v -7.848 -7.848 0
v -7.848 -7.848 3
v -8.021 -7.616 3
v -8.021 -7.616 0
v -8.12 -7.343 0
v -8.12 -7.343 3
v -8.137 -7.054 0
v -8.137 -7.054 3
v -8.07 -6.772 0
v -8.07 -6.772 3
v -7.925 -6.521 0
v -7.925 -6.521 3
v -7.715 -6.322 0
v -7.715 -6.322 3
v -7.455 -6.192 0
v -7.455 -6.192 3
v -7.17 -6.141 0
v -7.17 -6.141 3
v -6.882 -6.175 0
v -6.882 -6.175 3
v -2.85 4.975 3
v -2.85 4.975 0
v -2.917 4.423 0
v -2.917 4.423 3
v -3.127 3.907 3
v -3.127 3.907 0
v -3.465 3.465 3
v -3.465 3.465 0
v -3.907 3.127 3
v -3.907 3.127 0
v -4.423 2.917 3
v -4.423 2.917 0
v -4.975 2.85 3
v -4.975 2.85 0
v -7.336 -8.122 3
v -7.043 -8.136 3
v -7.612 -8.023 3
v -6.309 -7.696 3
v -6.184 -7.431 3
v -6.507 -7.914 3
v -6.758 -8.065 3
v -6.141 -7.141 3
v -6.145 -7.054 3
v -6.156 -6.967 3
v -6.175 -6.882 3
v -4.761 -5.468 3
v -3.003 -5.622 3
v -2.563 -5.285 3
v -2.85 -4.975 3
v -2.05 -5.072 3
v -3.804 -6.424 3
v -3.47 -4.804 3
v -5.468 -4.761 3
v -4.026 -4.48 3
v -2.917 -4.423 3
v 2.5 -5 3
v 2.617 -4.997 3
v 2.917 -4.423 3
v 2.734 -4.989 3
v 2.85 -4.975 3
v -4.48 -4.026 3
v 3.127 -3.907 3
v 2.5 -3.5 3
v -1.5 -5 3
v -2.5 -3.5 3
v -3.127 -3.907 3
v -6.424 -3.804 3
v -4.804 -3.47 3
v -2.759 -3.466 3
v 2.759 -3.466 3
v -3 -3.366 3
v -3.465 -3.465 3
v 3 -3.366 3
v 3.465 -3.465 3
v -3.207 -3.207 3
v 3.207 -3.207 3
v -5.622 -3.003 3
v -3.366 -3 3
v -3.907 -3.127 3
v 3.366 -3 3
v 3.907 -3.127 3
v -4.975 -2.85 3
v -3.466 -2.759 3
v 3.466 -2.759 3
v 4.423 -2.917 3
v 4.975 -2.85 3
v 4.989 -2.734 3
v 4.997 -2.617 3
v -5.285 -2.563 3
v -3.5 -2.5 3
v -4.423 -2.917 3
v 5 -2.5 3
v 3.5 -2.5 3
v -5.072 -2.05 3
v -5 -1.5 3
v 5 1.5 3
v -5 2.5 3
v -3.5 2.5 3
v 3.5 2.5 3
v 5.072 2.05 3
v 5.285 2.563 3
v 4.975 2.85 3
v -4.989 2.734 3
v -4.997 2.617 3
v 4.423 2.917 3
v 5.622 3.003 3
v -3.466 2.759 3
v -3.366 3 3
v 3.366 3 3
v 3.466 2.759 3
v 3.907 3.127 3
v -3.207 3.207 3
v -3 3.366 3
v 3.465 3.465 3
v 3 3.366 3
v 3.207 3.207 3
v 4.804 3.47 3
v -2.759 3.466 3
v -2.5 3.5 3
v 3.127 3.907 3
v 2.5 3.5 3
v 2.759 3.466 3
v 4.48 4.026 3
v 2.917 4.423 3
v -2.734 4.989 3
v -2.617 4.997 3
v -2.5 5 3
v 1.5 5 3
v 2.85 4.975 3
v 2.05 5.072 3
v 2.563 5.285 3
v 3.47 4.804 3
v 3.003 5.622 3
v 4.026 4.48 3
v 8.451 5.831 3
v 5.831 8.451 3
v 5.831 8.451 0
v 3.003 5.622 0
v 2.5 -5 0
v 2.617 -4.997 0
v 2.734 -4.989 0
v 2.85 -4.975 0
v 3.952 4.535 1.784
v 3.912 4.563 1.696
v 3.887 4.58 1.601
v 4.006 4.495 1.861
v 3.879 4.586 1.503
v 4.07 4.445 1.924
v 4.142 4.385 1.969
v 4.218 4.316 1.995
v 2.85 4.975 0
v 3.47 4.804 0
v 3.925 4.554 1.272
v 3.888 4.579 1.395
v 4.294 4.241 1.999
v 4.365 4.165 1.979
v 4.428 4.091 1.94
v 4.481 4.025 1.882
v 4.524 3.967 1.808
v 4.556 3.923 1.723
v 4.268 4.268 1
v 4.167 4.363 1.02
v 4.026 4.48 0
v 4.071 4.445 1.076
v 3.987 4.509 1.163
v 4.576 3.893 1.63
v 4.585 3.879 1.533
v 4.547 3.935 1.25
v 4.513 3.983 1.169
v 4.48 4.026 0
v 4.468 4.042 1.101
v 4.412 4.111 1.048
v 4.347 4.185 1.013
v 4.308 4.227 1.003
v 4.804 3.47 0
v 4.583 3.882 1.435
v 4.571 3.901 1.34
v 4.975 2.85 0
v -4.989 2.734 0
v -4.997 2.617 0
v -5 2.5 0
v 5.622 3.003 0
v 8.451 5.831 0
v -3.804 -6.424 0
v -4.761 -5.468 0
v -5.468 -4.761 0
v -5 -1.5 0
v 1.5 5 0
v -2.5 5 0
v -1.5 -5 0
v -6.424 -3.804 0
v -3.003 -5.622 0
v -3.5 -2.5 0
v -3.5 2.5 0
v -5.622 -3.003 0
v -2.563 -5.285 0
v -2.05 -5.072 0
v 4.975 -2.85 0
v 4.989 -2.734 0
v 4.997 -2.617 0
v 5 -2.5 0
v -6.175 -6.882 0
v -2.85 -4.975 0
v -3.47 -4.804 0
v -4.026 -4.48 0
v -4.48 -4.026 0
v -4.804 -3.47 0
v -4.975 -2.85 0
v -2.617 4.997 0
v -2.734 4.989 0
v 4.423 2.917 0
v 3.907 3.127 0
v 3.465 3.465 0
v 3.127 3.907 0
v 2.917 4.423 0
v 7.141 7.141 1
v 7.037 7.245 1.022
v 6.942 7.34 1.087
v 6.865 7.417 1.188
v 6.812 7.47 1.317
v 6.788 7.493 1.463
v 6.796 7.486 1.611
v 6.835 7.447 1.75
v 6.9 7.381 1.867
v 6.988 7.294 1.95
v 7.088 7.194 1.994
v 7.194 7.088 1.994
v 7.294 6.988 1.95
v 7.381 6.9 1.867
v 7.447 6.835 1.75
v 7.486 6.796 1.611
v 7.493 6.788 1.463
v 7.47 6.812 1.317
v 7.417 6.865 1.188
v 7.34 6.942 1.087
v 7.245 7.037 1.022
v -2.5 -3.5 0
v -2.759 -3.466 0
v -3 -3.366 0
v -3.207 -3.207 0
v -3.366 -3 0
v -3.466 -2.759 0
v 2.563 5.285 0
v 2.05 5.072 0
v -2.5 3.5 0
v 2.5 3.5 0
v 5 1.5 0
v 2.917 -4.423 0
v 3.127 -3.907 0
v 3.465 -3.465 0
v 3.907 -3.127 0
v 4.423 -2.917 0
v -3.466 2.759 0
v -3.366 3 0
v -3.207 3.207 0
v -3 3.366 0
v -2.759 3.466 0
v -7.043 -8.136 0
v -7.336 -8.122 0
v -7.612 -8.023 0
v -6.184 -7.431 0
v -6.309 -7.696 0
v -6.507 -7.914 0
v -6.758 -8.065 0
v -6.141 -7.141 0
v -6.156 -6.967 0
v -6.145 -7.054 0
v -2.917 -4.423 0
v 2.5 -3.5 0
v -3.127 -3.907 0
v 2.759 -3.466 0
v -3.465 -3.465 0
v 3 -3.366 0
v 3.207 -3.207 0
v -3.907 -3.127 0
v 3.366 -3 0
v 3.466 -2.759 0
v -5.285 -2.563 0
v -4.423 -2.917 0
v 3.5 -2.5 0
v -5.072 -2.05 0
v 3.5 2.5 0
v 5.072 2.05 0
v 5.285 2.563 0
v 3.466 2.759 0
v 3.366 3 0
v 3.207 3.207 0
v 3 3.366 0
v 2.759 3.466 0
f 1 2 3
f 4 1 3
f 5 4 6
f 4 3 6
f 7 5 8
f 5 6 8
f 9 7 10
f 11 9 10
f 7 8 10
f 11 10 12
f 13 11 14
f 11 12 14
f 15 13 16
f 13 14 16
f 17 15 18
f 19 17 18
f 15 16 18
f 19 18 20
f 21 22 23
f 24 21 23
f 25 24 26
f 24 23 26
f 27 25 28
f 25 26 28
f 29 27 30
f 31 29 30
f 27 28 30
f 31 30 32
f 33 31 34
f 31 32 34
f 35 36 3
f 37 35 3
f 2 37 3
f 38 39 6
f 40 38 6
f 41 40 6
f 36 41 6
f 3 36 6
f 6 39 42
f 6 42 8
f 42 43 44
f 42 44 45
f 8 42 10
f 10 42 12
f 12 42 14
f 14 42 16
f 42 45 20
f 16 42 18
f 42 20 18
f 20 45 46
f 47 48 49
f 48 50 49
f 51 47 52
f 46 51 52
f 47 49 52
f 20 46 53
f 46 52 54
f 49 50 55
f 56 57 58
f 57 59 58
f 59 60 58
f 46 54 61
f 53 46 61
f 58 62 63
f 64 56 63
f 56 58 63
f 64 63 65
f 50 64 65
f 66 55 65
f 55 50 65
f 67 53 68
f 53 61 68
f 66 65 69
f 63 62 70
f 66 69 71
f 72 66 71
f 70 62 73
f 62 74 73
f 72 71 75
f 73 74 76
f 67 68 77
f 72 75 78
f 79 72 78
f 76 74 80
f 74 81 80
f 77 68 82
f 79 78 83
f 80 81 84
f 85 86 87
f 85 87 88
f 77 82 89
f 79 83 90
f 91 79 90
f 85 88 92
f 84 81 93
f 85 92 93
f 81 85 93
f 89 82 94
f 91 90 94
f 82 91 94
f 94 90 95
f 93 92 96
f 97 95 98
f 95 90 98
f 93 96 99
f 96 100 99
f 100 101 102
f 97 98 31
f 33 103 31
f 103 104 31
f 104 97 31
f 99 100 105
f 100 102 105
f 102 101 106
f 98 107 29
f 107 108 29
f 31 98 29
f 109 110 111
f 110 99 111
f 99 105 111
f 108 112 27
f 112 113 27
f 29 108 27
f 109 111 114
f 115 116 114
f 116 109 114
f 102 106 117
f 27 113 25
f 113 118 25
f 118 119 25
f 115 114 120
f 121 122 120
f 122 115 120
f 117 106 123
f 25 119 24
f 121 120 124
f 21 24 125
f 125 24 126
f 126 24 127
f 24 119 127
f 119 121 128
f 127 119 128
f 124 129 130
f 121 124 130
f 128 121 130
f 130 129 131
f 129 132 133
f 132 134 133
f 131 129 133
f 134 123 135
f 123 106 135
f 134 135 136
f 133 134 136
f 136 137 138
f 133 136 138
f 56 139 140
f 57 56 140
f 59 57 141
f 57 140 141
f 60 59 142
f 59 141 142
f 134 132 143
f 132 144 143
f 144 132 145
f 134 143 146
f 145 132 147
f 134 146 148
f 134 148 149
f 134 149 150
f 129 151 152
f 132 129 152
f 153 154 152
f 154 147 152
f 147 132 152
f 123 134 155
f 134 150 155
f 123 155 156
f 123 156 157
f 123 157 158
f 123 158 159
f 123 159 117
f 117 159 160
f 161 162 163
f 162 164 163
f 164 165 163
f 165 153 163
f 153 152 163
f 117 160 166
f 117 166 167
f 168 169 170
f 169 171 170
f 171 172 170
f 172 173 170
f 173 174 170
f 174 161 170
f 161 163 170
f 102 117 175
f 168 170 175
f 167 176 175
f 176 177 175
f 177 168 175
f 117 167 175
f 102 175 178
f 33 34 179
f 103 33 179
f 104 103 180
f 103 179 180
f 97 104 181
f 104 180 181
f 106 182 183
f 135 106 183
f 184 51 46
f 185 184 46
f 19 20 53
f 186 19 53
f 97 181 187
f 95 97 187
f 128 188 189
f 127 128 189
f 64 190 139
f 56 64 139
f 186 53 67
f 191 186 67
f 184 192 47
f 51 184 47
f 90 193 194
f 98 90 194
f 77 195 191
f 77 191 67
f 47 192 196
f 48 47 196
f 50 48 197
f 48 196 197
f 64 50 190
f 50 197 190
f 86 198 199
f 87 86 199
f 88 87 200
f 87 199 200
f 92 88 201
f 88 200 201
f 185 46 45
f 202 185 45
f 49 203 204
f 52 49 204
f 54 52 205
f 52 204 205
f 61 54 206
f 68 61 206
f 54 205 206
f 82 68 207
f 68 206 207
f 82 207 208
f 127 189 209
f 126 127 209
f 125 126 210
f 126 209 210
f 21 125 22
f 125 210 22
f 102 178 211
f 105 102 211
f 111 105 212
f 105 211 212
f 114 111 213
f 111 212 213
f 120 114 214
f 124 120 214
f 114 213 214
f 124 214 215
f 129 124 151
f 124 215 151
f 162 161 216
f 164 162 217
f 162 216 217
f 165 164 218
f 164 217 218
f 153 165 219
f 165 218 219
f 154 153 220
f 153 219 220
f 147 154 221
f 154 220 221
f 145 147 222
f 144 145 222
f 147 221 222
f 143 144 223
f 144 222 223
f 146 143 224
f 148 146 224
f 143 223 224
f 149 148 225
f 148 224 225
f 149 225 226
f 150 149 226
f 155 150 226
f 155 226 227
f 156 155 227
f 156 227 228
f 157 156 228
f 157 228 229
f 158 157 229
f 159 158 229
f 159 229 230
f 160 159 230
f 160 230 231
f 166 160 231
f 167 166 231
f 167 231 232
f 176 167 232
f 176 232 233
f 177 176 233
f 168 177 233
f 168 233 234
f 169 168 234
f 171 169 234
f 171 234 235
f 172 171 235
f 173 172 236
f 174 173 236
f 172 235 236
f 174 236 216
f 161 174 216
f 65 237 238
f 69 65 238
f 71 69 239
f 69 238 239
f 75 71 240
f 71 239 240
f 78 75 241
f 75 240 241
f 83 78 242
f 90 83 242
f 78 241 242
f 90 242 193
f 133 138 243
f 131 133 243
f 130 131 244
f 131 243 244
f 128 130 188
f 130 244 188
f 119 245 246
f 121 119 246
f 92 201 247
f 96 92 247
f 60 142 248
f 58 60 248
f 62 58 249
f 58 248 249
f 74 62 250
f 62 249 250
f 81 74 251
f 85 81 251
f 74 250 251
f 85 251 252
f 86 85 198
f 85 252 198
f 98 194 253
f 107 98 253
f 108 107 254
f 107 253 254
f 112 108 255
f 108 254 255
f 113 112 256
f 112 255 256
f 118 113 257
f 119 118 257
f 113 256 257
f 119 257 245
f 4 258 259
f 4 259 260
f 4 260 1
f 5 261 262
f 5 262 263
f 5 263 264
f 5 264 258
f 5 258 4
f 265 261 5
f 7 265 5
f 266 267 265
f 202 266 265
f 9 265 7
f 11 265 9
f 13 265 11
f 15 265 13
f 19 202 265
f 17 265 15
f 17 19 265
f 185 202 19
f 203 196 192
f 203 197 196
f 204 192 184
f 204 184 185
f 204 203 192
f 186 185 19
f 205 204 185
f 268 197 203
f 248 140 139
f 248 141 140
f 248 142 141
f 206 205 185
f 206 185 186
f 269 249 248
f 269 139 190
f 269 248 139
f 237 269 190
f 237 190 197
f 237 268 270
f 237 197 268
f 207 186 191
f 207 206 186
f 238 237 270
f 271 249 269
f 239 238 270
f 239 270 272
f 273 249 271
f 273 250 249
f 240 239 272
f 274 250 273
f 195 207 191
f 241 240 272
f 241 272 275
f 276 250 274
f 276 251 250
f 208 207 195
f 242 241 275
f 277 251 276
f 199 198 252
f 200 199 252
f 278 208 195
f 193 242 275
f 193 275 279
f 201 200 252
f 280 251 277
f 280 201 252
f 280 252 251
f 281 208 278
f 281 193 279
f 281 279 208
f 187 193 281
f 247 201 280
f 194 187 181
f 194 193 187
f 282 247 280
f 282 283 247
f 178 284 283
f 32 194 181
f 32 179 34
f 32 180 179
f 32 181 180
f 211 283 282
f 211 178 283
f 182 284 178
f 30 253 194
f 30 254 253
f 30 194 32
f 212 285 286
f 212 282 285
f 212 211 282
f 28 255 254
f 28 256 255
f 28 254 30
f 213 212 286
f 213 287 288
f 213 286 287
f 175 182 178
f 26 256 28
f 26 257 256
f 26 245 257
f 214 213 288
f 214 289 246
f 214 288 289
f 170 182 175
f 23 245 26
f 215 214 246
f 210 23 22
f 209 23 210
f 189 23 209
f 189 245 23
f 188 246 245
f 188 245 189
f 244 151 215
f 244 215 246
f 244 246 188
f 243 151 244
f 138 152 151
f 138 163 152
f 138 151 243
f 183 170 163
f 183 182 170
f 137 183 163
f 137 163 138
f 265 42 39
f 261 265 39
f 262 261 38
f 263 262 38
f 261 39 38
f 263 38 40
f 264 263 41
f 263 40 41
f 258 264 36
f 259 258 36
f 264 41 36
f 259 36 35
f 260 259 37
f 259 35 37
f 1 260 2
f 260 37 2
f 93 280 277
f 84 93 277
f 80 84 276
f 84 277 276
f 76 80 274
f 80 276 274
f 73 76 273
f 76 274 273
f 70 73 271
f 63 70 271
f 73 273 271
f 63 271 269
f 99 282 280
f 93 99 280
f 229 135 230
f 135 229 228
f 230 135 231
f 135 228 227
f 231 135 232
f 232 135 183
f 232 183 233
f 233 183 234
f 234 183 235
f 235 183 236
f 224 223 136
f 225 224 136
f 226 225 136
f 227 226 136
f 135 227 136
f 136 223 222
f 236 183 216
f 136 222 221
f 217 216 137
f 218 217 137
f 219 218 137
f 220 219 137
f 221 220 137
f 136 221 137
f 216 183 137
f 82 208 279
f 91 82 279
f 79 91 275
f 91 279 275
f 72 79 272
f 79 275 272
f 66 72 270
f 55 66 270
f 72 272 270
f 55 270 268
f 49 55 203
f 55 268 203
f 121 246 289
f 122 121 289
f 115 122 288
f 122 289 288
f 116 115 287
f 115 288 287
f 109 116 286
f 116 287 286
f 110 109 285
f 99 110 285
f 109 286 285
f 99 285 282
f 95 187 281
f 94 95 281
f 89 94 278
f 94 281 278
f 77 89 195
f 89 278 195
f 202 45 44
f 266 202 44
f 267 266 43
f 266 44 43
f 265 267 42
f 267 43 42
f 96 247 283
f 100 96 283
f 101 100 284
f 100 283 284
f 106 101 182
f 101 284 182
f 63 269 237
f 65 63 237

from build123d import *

# Parameters (mm, degrees)
EXTRUDE_1_DEPTH     = 3
SKETCH_4_W          = 3
SKETCH_4_H          = 3.704951288
EXTRUDE_3_DEPTH     = 1
CUT_EXTRUDE_2_REACH = 25.05
SKETCH_6_R          = 0.5
CUT_EXTRUDE_1_DEPTH = 3


with BuildPart() as part:
    # 草图1 → 凸台-拉伸1 (new body)
    with BuildSketch(Plane.XY):
        with BuildLine():
            ThreePointArc((-4.975392322, 2.84990406), (-4.993840493, 2.675384142), (-5, 2.5))
            Line((-5, 2.5), (-5, -1.5))
            Line((-5, -1.5), (-5, -2.5))
            ThreePointArc((-5, -2.5), (-4.993840493, -2.675384142), (-4.975392322, -2.84990406))
            ThreePointArc((-4.975392322, -2.84990406), (-3.464823228, -3.464823228), (-2.84990406, -4.975392322))
            ThreePointArc((-2.84990406, -4.975392322), (-2.675384142, -4.993840493), (-2.5, -5))
            Line((-2.5, -5), (-1.5, -5))
            Line((-1.5, -5), (2.5, -5))
            ThreePointArc((2.5, -5), (2.675384142, -4.993840493), (2.84990406, -4.975392322))
            ThreePointArc((2.84990406, -4.975392322), (3.464823228, -3.464823228), (4.975392322, -2.84990406))
            ThreePointArc((4.975392322, -2.84990406), (4.993840493, -2.675384142), (5, -2.5))
            Line((5, -2.5), (5, 1.5))
            Line((5, 1.5), (5, 2.5))
            ThreePointArc((5, 2.5), (4.993840493, 2.675384142), (4.975392322, 2.84990406))
            ThreePointArc((4.975392322, 2.84990406), (3.464823228, 3.464823228), (2.84990406, 4.975392322))
            ThreePointArc((2.84990406, 4.975392322), (2.675384142, 4.993840493), (2.5, 5))
            Line((2.5, 5), (1.5, 5))
            Line((1.5, 5), (-2.5, 5))
            ThreePointArc((-2.5, 5), (-2.675384142, 4.993840493), (-2.84990406, 4.975392322))
            ThreePointArc((-2.84990406, 4.975392322), (-3.464823228, 3.464823228), (-4.975392322, 2.84990406))
        make_face()
        with BuildLine():
            ThreePointArc((-3.5, 2.5), (-3.207106781, 3.207106781), (-2.5, 3.5))
            Line((-2.5, 3.5), (2.5, 3.5))
            ThreePointArc((2.5, 3.5), (3.207106781, 3.207106781), (3.5, 2.5))
            Line((3.5, 2.5), (3.5, -2.5))
            ThreePointArc((3.5, -2.5), (3.207106781, -3.207106781), (2.5, -3.5))
            Line((2.5, -3.5), (-2.5, -3.5))
            ThreePointArc((-2.5, -3.5), (-3.207106781, -3.207106781), (-3.5, -2.5))
            Line((-3.5, -2.5), (-3.5, 2.5))
        make_face(mode=Mode.SUBTRACT)
        with BuildLine():
            Line((-5, -2.5), (-5, -1.5))
            ThreePointArc((-5, -1.5), (-5.161755993, -2.313202294), (-5.62239809, -3.00260191))
            Line((-5.62239809, -3.00260191), (-8.450825215, -5.831029035))
            Line((-8.450825215, -5.831029035), (-5.831029035, -8.450825215))
            Line((-5.831029035, -8.450825215), (-3.00260191, -5.62239809))
            ThreePointArc((-3.00260191, -5.62239809), (-2.313202294, -5.161755993), (-1.5, -5))
            Line((-1.5, -5), (-2.5, -5))
            ThreePointArc((-2.5, -5), (-2.675384142, -4.993840493), (-2.84990406, -4.975392322))
            ThreePointArc((-2.84990406, -4.975392322), (-4.267766953, -4.267766953), (-4.975392322, -2.84990406))
            ThreePointArc((-4.975392322, -2.84990406), (-4.993840493, -2.675384142), (-5, -2.5))
        make_face()
        with BuildLine():
            ThreePointArc((3.00260191, 5.62239809), (2.313202294, 5.161755993), (1.5, 5))
            Line((1.5, 5), (2.5, 5))
            ThreePointArc((2.5, 5), (2.675384142, 4.993840493), (2.84990406, 4.975392322))
            ThreePointArc((2.84990406, 4.975392322), (4.267766953, 4.267766953), (4.975392322, 2.84990406))
            ThreePointArc((4.975392322, 2.84990406), (4.993840493, 2.675384142), (5, 2.5))
            Line((5, 2.5), (5, 1.5))
            ThreePointArc((5, 1.5), (5.161755993, 2.313202294), (5.62239809, 3.00260191))
            Line((5.62239809, 3.00260191), (8.450825215, 5.831029035))
            Line((8.450825215, 5.831029035), (5.831029035, 8.450825215))
            Line((5.831029035, 8.450825215), (3.00260191, 5.62239809))
        make_face()
    extrude(amount=EXTRUDE_1_DEPTH)

    # 草图4 → 凸台-拉伸3 (add)
    with BuildSketch(Plane(origin=(-7.140927125, -7.140927125, 0), x_dir=(0, 0, 1), z_dir=(-0.707106781, -0.707106781, 0))):
        with Locations((1.5, 0)):
            Rectangle(SKETCH_4_W, SKETCH_4_H)
    extrude(amount=EXTRUDE_3_DEPTH)

    # 草图6 → 切除-拉伸2 (cut, up to next)
    with BuildSketch(Plane(origin=(7.140927125, 7.140927125, 0), x_dir=(0, 0, -1), z_dir=(0.707106781, 0.707106781, 0)), mode=Mode.PRIVATE) as cut_extrude_2_sk1:
        with Locations((-1.5, 0)):
            Circle(SKETCH_6_R)
    cut_extrude_2_tool1 = extrude(cut_extrude_2_sk1.sketch, amount=-CUT_EXTRUDE_2_REACH, mode=Mode.PRIVATE) & part.part
    add(cut_extrude_2_tool1.solids().sort_by_distance((7.140927, 7.140927, 1.5))[0], mode=Mode.SUBTRACT)

    # 草图5 → 切除-拉伸1 (cut)
    with BuildSketch(Plane.XY.offset(3)):
        with BuildLine():
            Line((-6.88210808, -6.175001298), (-5.467894517, -4.760787736))
            Line((-5.467894517, -4.760787736), (-6.424239217, -3.804443037))
            Line((-6.424239217, -3.804443037), (-9.157931996, -6.538135816))
            Line((-9.157931996, -6.538135816), (-7.848033901, -7.848033911))
            ThreePointArc((-7.848033901, -7.848033911), (-8.00695253, -6.640927128), (-6.88210808, -6.175001298))
        make_face()
        with BuildLine():
            Line((-3.804443037, -6.424239217), (-4.760787736, -5.467894517))
            Line((-4.760787736, -5.467894517), (-6.175001298, -6.88210808))
            ThreePointArc((-6.175001298, -6.88210808), (-6.149482263, -7.010400933), (-6.140927125, -7.140927125))
            ThreePointArc((-6.140927125, -7.140927125), (-6.758243689, -8.064806656), (-7.848033901, -7.848033911))
            Line((-7.848033901, -7.848033911), (-6.538135816, -9.157931996))
            Line((-6.538135816, -9.157931996), (-3.804443037, -6.424239217))
        make_face()
    extrude(amount=-CUT_EXTRUDE_1_DEPTH, mode=Mode.SUBTRACT)


solid = part.part
